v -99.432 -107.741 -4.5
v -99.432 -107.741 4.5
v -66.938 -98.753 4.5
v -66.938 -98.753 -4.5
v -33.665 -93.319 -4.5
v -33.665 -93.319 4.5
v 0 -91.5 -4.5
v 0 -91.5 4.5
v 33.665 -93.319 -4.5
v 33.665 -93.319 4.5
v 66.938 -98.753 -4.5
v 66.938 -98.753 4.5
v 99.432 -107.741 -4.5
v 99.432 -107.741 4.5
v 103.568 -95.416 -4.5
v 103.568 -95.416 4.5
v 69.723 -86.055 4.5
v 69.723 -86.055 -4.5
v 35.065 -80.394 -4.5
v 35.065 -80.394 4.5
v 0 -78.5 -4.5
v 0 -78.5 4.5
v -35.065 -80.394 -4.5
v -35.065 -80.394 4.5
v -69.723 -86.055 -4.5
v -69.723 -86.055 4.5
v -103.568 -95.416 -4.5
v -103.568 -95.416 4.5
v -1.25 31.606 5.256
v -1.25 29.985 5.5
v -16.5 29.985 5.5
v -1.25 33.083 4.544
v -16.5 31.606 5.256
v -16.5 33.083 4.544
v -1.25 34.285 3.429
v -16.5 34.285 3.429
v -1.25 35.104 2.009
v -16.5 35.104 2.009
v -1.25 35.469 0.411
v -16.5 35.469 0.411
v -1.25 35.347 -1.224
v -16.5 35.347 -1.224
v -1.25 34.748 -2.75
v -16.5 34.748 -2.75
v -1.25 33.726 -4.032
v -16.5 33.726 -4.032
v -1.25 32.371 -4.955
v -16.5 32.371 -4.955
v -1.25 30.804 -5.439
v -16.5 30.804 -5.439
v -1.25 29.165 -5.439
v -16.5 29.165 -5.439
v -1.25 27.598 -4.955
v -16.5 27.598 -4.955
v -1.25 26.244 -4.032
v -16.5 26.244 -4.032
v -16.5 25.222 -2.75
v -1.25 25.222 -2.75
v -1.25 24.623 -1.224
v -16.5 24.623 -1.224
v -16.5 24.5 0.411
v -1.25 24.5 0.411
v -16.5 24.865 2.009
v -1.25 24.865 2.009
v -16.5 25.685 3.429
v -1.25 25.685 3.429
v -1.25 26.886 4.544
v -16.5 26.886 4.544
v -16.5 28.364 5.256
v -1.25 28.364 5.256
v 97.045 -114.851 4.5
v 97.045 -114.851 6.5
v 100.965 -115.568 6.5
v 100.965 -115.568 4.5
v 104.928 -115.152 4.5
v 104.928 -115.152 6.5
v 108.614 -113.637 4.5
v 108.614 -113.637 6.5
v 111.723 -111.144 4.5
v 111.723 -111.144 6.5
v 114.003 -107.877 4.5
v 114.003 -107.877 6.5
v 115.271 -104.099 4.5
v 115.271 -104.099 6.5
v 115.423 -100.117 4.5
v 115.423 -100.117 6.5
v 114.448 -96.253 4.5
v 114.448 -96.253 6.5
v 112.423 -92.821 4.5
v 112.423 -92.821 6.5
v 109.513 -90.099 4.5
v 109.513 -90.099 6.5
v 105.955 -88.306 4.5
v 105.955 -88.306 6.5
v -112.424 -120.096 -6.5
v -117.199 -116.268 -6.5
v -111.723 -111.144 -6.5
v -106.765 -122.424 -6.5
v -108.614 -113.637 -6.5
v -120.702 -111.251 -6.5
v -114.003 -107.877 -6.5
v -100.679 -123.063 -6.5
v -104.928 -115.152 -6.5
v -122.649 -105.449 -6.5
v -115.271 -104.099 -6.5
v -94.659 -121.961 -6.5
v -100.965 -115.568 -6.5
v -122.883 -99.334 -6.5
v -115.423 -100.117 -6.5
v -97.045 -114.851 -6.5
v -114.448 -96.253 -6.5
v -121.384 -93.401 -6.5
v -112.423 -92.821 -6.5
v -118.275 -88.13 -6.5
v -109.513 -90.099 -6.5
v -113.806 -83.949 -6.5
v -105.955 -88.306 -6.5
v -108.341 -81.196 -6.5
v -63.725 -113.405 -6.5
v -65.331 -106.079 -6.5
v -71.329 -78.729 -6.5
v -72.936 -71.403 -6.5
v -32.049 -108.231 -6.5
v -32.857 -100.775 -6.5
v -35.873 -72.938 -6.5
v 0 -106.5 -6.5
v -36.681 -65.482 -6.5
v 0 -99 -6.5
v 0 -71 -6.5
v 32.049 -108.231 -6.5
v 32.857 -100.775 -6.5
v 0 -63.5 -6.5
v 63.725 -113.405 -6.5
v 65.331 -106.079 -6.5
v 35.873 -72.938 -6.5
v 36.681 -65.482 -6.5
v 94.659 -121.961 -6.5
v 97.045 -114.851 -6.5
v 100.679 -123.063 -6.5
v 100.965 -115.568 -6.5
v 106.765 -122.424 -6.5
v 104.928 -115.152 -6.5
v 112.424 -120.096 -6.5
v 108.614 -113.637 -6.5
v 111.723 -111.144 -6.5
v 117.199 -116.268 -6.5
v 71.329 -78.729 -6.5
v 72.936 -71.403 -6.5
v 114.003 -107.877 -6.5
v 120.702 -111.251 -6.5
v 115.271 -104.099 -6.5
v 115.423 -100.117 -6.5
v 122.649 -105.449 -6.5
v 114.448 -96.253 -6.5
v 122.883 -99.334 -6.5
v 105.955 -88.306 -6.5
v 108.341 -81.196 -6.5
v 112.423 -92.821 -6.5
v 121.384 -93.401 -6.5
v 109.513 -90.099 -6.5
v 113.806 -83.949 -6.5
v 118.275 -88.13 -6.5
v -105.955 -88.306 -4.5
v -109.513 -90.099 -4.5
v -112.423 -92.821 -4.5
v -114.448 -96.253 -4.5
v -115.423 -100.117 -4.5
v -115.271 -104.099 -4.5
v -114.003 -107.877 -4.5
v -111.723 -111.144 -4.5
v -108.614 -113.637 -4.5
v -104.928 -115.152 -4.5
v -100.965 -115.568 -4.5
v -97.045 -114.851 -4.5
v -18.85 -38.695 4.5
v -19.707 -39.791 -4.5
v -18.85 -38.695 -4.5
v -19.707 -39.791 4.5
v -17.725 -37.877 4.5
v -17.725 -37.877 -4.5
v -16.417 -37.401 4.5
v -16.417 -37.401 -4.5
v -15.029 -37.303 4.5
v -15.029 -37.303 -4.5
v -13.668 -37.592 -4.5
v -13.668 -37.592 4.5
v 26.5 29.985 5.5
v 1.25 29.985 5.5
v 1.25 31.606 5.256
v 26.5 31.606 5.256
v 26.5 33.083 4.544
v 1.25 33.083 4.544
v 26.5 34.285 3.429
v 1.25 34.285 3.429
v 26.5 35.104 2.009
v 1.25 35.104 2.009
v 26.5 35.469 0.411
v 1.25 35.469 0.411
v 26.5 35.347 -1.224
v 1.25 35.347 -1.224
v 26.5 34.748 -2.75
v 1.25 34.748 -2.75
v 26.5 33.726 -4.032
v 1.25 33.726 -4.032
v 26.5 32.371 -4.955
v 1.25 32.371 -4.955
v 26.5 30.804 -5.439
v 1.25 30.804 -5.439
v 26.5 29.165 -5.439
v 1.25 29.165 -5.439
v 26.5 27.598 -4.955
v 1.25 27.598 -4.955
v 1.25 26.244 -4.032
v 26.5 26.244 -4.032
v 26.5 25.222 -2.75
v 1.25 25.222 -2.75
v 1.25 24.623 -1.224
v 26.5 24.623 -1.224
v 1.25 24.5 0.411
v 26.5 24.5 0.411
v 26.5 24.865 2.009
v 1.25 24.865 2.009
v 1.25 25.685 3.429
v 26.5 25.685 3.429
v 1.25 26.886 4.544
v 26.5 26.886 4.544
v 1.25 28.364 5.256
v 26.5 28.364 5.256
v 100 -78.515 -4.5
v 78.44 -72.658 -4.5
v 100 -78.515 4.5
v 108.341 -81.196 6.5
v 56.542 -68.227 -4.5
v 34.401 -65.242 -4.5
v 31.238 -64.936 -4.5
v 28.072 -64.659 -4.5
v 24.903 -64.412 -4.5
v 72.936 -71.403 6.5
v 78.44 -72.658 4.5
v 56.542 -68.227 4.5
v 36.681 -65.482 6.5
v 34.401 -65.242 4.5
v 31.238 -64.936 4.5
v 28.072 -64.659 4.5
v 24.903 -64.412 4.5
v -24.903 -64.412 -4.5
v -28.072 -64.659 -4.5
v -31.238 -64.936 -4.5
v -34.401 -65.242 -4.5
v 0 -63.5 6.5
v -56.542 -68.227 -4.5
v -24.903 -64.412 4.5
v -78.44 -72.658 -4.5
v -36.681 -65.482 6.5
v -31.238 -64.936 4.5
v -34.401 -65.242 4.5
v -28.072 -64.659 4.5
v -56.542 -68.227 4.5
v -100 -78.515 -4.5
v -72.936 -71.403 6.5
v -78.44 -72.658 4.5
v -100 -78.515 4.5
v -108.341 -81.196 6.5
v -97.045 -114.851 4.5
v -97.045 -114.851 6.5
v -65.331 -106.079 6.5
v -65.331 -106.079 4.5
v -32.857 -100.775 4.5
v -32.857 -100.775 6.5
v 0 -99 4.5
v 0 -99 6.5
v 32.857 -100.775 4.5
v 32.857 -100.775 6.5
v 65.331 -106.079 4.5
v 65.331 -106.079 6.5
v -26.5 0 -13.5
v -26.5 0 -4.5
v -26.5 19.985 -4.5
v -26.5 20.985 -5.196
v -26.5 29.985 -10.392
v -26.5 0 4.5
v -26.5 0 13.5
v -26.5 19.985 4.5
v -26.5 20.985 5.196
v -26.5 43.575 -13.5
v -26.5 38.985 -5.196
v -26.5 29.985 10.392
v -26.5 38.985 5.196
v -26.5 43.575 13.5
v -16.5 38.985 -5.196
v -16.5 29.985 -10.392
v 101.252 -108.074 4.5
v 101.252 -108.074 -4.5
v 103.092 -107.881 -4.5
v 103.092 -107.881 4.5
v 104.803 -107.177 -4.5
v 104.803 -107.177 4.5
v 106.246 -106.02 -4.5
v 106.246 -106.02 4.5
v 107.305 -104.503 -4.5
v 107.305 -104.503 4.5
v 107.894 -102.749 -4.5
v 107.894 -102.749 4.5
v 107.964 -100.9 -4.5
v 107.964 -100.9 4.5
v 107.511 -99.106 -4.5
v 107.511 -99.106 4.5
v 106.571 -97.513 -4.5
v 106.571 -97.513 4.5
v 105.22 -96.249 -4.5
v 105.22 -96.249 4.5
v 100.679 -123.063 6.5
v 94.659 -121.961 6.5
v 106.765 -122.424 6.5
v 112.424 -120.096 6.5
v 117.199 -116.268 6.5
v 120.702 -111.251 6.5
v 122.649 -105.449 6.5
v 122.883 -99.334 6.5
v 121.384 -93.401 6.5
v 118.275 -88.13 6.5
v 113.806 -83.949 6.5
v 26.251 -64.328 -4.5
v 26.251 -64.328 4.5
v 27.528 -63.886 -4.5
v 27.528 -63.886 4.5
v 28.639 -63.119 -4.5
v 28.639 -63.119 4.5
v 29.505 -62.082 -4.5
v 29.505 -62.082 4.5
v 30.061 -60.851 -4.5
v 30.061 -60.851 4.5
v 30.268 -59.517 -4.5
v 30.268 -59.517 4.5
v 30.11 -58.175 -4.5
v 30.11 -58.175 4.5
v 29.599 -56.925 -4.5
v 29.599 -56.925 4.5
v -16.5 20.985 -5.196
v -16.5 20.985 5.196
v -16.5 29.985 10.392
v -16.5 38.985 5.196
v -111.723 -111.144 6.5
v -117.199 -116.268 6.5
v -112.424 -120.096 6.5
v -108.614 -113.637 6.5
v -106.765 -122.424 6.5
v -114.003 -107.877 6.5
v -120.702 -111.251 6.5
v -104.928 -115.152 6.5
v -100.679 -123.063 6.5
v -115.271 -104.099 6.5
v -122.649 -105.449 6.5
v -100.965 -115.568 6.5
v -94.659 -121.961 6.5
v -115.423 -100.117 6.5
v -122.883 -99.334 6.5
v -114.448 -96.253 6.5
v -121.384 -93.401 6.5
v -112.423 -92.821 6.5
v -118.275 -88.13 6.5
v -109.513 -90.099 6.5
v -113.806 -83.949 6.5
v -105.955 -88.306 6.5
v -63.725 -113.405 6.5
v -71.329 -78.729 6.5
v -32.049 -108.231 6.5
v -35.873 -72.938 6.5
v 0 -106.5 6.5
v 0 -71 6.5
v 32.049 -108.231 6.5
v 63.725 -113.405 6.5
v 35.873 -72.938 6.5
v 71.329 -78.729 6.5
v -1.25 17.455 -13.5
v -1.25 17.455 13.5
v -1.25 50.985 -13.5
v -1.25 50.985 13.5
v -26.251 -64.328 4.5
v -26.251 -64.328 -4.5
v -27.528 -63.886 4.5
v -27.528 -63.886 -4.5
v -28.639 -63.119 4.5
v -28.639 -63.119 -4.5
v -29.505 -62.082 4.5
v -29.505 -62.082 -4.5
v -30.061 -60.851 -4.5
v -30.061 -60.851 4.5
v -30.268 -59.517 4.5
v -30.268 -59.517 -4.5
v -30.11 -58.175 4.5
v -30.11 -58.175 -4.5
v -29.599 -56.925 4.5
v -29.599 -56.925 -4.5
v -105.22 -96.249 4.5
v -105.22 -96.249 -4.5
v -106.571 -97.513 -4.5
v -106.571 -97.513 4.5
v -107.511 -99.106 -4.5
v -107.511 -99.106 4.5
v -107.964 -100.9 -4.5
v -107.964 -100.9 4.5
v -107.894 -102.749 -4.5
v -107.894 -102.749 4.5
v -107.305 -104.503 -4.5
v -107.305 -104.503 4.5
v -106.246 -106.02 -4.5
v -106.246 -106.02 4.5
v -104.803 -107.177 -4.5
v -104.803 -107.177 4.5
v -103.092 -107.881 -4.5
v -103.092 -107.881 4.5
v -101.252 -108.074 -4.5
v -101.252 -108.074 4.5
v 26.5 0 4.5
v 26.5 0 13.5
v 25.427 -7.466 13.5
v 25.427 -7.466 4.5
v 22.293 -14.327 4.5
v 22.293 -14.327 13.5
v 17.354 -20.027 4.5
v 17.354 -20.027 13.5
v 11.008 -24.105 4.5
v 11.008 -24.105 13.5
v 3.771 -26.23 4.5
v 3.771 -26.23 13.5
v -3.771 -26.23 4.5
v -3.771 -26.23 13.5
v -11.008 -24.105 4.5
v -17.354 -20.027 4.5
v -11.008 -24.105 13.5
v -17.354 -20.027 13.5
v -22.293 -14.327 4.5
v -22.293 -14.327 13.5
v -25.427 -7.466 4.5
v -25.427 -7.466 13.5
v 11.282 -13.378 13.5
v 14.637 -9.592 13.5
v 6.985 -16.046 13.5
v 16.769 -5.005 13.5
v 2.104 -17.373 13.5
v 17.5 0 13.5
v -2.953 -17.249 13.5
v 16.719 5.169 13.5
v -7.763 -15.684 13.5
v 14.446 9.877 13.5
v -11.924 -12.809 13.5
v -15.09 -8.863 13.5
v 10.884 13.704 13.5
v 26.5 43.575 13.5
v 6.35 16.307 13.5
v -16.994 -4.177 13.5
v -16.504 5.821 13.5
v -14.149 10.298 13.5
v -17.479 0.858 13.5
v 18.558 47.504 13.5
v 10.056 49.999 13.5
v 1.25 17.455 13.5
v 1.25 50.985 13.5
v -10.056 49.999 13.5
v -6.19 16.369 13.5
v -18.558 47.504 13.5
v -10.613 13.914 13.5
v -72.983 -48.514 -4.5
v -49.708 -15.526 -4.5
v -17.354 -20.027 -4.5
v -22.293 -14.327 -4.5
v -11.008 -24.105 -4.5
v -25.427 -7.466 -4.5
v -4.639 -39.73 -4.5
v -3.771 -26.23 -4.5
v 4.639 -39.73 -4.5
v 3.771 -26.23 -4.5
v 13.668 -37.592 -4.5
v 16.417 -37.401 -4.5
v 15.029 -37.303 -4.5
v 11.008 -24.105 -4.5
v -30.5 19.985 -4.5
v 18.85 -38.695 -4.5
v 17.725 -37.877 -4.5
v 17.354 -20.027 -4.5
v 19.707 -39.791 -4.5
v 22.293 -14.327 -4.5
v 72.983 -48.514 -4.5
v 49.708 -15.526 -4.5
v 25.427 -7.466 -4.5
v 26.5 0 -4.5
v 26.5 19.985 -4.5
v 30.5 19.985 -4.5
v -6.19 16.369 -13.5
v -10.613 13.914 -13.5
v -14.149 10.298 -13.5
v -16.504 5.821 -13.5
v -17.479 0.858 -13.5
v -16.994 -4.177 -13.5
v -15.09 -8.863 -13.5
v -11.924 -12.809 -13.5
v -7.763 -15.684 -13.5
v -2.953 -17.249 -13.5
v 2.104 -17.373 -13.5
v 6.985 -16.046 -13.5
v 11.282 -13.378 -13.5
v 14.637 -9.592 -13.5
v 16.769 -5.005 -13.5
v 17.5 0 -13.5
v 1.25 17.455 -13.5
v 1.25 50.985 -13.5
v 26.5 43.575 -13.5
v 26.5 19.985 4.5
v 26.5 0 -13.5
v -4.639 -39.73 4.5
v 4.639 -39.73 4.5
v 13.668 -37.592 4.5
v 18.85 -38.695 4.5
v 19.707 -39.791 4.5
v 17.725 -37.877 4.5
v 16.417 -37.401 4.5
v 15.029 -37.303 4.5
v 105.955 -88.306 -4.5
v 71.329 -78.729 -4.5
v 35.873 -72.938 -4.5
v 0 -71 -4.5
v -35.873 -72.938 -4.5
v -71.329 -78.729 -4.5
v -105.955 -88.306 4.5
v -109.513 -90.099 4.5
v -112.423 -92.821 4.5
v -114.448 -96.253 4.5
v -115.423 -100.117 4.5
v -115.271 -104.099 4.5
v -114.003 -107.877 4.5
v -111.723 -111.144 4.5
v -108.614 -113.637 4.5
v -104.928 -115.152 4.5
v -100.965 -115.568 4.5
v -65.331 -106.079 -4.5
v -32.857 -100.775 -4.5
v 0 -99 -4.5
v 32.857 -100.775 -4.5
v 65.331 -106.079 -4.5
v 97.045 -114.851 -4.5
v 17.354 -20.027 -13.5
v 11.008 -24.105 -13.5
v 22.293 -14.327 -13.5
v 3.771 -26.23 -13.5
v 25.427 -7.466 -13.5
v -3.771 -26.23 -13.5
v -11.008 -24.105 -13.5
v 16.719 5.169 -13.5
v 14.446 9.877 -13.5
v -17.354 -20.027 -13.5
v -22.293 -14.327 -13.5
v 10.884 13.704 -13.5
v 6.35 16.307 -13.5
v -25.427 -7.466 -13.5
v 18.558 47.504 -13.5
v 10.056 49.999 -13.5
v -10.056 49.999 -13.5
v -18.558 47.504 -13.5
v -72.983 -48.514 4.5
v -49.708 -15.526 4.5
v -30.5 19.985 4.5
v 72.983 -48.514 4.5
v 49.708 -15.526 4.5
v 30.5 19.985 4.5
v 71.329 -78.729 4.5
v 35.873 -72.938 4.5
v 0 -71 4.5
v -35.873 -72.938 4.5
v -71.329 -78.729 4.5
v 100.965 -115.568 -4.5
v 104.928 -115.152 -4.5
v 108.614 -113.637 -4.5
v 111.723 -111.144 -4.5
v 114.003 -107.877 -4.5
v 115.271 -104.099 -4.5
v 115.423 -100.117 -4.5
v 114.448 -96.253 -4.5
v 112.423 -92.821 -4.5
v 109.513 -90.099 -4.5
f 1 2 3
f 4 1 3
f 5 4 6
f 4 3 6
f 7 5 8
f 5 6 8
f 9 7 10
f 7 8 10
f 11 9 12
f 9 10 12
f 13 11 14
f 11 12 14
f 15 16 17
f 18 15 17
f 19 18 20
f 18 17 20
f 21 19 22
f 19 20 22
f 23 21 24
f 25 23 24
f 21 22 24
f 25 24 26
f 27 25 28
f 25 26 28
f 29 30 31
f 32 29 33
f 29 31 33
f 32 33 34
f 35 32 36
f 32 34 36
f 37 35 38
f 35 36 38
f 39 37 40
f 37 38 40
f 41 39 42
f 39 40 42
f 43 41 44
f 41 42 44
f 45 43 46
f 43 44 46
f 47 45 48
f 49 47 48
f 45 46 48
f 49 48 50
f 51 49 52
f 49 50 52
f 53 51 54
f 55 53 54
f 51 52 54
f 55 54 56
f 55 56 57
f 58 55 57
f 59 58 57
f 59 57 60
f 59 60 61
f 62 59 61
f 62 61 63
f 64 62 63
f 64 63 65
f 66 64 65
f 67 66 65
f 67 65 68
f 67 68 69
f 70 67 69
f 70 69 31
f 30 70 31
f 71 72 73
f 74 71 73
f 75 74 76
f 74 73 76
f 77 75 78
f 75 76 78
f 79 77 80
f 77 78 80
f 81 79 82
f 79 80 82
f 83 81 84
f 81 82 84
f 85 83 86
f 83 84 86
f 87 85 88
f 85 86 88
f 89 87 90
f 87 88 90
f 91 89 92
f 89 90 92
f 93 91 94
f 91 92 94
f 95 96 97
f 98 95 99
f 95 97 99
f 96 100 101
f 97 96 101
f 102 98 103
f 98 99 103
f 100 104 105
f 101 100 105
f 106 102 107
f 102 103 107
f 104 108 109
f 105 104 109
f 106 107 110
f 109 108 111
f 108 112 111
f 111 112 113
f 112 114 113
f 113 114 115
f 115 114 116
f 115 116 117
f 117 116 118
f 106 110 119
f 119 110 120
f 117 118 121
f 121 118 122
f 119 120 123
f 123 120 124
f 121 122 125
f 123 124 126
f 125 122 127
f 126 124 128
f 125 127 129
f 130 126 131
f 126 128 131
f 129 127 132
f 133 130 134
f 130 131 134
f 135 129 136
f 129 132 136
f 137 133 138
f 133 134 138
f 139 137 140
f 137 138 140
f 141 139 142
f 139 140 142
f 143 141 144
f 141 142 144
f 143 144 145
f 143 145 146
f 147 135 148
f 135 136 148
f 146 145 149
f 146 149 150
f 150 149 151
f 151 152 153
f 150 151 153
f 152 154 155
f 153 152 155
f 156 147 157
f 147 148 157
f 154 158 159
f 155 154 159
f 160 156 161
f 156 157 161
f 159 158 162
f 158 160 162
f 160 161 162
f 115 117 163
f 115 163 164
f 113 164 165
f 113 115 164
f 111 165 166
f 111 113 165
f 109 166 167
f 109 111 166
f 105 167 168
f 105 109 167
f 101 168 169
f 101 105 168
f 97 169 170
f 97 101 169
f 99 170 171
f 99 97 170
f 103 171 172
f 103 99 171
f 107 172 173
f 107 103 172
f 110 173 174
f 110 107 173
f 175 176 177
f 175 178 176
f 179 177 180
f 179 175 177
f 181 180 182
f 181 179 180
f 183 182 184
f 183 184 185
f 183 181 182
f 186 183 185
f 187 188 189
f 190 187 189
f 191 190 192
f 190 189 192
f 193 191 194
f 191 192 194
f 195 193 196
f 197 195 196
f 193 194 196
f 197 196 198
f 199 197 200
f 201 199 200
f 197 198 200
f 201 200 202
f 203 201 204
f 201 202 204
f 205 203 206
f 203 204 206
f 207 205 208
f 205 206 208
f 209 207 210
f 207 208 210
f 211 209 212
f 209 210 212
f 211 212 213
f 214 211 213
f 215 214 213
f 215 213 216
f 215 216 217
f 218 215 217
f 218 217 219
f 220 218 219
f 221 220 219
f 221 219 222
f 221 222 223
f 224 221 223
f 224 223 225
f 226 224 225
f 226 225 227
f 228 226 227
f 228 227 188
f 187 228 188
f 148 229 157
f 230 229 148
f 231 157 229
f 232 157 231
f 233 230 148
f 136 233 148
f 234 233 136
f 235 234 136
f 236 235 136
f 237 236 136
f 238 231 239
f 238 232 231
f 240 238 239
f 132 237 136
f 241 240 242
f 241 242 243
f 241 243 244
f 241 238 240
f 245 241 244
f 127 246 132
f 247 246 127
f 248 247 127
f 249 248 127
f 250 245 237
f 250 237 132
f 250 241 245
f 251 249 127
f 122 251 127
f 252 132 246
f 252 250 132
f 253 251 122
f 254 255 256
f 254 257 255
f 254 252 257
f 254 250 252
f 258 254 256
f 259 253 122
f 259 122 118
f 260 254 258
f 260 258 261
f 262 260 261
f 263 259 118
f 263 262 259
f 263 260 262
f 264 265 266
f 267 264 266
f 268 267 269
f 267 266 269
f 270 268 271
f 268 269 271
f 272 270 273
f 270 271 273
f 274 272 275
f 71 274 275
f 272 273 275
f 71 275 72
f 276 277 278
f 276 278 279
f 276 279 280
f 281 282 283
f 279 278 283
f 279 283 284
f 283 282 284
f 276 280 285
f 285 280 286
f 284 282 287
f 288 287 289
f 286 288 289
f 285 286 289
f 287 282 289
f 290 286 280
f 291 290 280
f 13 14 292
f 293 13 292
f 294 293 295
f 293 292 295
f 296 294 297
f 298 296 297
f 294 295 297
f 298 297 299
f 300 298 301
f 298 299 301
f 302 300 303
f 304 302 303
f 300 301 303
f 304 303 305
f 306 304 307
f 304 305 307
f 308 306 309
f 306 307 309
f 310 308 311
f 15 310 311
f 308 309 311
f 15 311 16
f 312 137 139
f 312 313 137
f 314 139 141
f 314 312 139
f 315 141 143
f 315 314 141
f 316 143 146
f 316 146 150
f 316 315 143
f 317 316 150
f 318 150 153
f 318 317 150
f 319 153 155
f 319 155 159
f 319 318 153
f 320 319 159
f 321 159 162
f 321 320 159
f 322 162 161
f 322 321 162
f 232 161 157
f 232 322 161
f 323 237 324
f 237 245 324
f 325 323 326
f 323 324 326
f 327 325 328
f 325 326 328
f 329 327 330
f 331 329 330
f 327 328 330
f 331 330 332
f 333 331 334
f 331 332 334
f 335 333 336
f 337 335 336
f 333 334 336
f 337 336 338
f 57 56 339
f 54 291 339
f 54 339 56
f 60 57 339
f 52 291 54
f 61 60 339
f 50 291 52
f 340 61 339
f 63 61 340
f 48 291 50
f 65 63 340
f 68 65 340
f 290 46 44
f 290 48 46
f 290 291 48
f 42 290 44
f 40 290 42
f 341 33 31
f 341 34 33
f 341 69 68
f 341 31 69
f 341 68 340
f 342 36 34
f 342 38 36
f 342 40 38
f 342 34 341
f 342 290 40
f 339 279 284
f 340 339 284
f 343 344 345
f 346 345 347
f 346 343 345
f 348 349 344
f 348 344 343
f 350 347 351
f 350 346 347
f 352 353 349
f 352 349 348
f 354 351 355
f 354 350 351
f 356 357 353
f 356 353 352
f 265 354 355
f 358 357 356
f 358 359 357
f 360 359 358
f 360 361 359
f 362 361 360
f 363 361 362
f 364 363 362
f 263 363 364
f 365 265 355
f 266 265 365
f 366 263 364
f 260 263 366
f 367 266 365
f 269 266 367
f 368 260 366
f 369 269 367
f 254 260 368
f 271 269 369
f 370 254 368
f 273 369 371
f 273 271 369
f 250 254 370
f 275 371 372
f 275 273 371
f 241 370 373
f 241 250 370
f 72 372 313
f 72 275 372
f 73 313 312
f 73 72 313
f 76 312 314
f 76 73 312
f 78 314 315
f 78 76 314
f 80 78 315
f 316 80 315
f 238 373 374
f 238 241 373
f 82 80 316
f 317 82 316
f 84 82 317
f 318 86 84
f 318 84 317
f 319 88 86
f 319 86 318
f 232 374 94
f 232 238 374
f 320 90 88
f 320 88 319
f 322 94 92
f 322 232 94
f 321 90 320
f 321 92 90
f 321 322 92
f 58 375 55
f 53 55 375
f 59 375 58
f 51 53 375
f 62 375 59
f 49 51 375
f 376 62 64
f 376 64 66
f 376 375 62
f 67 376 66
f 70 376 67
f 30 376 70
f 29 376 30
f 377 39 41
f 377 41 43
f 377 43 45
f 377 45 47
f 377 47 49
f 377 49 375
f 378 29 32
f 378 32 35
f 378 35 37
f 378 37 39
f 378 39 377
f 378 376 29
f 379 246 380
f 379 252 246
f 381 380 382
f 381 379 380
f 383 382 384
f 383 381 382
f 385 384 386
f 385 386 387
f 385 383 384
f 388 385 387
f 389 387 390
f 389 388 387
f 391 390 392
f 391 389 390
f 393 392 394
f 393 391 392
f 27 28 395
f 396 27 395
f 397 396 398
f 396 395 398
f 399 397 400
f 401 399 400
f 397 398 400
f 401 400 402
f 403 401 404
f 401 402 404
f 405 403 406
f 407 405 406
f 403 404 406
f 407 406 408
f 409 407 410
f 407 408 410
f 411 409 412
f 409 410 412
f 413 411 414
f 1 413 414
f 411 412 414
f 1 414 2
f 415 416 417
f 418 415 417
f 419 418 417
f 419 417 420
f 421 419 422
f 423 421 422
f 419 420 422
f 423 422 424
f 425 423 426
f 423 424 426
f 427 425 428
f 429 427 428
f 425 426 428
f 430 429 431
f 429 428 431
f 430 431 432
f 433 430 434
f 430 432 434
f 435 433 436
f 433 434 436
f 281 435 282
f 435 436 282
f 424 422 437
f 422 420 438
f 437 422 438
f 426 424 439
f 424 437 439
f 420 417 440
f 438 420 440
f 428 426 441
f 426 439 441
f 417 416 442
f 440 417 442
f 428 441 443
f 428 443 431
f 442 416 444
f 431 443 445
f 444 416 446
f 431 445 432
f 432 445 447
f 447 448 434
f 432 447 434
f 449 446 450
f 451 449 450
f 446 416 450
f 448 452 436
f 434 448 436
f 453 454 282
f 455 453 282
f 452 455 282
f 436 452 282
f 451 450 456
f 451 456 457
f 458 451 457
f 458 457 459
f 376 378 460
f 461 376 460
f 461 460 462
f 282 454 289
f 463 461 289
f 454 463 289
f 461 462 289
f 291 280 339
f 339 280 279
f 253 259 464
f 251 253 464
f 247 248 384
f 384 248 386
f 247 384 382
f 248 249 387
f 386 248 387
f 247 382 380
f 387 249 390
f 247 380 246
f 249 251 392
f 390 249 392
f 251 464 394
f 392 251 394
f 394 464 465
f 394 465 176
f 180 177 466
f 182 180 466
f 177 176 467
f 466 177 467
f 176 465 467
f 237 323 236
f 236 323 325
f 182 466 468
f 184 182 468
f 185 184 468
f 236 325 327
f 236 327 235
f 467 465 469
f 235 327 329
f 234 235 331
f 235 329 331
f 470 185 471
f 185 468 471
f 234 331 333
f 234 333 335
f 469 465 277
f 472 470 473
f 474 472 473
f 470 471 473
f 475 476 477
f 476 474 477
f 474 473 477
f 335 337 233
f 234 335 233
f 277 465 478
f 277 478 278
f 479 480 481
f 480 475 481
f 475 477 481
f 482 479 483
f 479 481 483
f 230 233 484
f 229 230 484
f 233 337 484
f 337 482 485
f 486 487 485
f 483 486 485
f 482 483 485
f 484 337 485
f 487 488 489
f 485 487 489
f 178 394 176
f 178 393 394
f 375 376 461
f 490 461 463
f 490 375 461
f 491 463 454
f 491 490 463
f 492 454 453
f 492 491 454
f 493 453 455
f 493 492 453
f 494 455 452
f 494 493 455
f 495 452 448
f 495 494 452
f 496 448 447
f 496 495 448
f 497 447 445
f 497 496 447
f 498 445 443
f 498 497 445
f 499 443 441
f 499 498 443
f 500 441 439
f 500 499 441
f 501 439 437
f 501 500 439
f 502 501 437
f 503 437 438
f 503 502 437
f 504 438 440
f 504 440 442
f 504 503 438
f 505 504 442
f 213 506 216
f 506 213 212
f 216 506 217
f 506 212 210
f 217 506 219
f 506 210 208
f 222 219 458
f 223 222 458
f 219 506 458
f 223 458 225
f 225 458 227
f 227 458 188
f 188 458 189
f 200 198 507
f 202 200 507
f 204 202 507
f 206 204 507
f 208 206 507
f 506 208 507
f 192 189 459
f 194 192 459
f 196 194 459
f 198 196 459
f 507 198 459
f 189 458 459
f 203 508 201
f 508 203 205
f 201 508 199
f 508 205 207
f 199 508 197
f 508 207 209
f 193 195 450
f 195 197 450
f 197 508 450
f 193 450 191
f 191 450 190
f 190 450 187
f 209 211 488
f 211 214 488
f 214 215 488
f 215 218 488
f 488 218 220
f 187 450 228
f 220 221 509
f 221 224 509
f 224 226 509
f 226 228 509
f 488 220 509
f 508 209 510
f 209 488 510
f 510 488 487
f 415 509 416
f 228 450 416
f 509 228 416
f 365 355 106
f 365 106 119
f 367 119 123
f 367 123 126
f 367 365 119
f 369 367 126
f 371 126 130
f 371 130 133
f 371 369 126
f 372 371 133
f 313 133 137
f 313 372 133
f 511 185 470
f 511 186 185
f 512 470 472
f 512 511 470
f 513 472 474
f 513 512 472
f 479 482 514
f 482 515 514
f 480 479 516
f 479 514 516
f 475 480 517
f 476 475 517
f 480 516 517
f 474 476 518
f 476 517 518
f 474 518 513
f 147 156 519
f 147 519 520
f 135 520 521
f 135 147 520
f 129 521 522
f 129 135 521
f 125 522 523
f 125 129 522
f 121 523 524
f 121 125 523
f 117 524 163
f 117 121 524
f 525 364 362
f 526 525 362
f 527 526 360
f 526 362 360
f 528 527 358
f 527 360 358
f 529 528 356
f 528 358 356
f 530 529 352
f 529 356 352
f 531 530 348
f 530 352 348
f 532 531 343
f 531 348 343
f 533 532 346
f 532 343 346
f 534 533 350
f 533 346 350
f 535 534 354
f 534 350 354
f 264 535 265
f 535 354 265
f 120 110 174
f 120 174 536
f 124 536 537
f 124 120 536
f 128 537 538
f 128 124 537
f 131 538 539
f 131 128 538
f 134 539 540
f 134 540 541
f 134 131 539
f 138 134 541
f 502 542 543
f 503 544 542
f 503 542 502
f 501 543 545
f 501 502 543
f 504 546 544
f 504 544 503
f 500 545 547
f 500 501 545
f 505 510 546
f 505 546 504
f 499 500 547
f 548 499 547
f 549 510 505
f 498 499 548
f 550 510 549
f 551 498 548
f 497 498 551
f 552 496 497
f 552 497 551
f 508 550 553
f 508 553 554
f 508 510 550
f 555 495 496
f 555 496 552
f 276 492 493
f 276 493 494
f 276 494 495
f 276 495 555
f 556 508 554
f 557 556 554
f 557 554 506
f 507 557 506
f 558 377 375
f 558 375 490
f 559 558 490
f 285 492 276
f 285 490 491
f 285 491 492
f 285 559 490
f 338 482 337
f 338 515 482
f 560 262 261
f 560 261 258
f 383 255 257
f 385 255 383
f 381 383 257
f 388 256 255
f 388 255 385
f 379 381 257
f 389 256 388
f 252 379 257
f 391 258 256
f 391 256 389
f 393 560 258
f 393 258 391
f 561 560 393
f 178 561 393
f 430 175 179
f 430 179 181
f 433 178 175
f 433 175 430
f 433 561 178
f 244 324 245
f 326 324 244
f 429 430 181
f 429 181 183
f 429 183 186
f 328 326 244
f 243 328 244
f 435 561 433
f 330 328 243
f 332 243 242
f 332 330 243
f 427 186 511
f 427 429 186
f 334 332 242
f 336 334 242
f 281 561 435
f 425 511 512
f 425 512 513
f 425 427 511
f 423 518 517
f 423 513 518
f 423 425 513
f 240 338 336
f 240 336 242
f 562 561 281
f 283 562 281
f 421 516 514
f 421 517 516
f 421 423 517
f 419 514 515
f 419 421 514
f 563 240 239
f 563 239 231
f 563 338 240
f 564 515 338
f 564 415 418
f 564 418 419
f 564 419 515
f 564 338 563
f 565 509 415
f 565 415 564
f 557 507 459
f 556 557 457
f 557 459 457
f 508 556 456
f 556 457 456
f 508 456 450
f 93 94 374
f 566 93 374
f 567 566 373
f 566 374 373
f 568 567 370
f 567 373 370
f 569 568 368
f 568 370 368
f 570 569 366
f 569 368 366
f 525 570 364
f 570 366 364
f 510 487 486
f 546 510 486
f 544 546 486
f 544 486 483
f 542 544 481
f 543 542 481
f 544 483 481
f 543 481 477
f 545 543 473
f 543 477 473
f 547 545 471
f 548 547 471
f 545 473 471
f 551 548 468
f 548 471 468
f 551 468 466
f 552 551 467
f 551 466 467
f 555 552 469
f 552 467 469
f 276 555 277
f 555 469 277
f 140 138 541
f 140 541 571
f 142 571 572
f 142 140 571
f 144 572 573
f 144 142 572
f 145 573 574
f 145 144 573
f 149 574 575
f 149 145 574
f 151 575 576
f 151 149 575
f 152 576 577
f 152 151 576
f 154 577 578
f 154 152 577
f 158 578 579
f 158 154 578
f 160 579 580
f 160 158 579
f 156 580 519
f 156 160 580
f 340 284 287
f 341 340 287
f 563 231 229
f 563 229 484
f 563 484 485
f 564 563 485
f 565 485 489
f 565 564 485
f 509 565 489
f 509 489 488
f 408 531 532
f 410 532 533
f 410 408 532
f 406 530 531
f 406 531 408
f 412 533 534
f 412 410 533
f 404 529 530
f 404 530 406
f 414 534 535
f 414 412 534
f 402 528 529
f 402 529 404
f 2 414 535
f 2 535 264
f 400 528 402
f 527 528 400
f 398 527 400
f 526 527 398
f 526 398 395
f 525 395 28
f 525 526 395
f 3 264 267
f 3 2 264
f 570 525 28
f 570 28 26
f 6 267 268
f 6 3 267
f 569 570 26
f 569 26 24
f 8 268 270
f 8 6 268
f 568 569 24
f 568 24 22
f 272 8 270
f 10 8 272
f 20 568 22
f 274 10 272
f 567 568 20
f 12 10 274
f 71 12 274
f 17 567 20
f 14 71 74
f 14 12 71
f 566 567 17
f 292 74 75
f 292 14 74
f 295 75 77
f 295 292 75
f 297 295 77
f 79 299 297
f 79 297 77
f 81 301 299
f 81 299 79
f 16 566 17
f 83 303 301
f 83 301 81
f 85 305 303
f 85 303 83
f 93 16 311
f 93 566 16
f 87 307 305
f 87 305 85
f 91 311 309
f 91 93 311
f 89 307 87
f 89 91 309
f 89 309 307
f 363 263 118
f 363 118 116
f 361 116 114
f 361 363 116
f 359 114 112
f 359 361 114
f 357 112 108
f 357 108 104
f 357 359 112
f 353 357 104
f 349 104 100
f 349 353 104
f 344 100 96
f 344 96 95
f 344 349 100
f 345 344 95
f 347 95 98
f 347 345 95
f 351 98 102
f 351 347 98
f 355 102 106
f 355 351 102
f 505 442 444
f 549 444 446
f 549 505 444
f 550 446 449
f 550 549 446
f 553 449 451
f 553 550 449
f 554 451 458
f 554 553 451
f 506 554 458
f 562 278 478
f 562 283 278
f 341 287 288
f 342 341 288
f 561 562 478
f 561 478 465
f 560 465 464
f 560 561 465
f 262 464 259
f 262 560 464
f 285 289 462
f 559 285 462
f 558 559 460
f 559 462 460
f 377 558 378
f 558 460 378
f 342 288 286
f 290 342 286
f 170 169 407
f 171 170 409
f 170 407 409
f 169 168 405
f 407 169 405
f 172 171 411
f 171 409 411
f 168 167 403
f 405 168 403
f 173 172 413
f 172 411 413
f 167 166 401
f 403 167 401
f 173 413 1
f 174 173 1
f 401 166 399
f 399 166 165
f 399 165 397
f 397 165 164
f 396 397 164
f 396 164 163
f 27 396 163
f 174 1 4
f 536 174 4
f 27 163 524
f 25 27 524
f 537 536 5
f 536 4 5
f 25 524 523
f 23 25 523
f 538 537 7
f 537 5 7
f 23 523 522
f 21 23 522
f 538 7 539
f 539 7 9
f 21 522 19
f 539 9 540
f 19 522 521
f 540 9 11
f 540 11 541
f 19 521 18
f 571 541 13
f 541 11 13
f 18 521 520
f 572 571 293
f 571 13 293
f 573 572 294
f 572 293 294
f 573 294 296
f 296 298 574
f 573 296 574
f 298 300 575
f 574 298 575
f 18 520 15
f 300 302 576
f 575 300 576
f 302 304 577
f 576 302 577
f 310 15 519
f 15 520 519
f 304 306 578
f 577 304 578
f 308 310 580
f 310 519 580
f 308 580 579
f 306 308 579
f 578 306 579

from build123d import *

# Parameters (mm, degrees)
SKETCH_1_R          = 17.5
EXTRUDE_1_DEPTH     = 13.5
SKETCH_2_W          = 2.5
SKETCH_2_H          = 56.398475778
CUT_EXTRUDE_1_DEPTH = 64.5
SKETCH_3_R          = 5.5
CUT_EXTRUDE_2_DEPTH = 75.770900088
EXTRUDE_2_DEPTH     = 6.5
CUT_EXTRUDE_3_DEPTH = 2
SKETCH_6_R          = 0.0005
CUT_EXTRUDE_4_DEPTH = 175.932337555
EXTRUDE_3_DEPTH     = 4.5
FILLET_1_R          = 5
CUT_EXTRUDE_5_DEPTH = 10


with BuildPart() as part:
    # 草图1 → 凸台-拉伸1 (new, symmetric)
    with BuildSketch(Plane.XY):
        with BuildLine():
            Line((-26.5, 0), (-26.5, 43.574648593))
            ThreePointArc((-26.5, 43.574648593), (0, 51), (26.5, 43.574648593))
            Line((26.5, 43.574648593), (26.5, 0))
            ThreePointArc((26.5, 0), (0, -26.5), (-26.5, 0))
        make_face()
        Circle(SKETCH_1_R, mode=Mode.SUBTRACT)
    extrude(amount=EXTRUDE_1_DEPTH, both=True)

    # 草图2 → 切除-拉伸1 (cut, through all)
    with BuildSketch(Plane.XY.offset(13.5)):
        with Locations((0, 36.367769247)):
            Rectangle(SKETCH_2_W, SKETCH_2_H)
    extrude(amount=-CUT_EXTRUDE_1_DEPTH, mode=Mode.SUBTRACT)

    # 草图3 → 切除-拉伸2 (cut, through all)
    with BuildSketch(Plane.ZY.offset(26.5)):
        with Locations((0, 29.984679071)):
            Circle(SKETCH_3_R)
    extrude(amount=-CUT_EXTRUDE_2_DEPTH, mode=Mode.SUBTRACT)



with BuildPart() as body_2:
    # 草图4 → 凸台-拉伸2 (new, symmetric)
    with BuildSketch(Plane.XY):
        with BuildLine():
            ThreePointArc((108.340909091, -81.195883828), (0, -63.5), (-108.340909091, -81.195883828))
            ThreePointArc((-108.340909091, -81.195883828), (-121.88263876, -108.419431679), (-94.659090909, -121.961161348))
            ThreePointArc((-94.659090909, -121.961161348), (0, -106.5), (94.659090909, -121.961161348))
            ThreePointArc((94.659090909, -121.961161348), (121.88263876, -108.419431679), (108.340909091, -81.195883828))
        make_face()
    extrude(amount=EXTRUDE_2_DEPTH, both=True)

    # 草图5 → 切除-拉伸3 (cut)
    with BuildSketch(Plane.XY.offset(6.5)):
        with BuildLine():
            ThreePointArc((105.954545455, -88.306106652), (0, -71), (-105.954545455, -88.306106652))
            ThreePointArc((-105.954545455, -88.306106652), (-114.772415937, -106.033068043), (-97.045454545, -114.850938525))
            ThreePointArc((-97.045454545, -114.850938525), (0, -99), (97.045454545, -114.850938525))
            ThreePointArc((97.045454545, -114.850938525), (114.772415937, -106.033068043), (105.954545455, -88.306106652))
        make_face()
    cut_extrude_3 = extrude(amount=-CUT_EXTRUDE_3_DEPTH, mode=Mode.SUBTRACT)

    # 镜向1: 切除-拉伸3 across plane
    add(cut_extrude_3.mirror(Plane.XY), mode=Mode.SUBTRACT)

    # 草图6 → 切除-拉伸4 (cut, through all)
    with BuildSketch(Plane.XY.offset(4.5)):
        with BuildLine():
            ThreePointArc((103.568181818, -95.416329475), (0, -78.5), (-103.568181818, -95.416329475))
            ThreePointArc((-103.568181818, -95.416329475), (-107.662193113, -103.646704406), (-99.431818182, -107.740715702))
            ThreePointArc((-99.431818182, -107.740715702), (0, -91.5), (99.431818182, -107.740715702))
            ThreePointArc((99.431818182, -107.740715702), (107.662193113, -103.646704406), (103.568181818, -95.416329475))
        make_face()
        with Locations((0, -85)):
            Circle(SKETCH_6_R, mode=Mode.SUBTRACT)
    extrude(amount=-CUT_EXTRUDE_4_DEPTH, mode=Mode.SUBTRACT)


with BuildPart() as cut_extrude_4_piece_1:
    # of the separate pieces the step leaves, piece 1, a body of its own (cut_extrude_4_pieces)
    add(body_2.part.solids().sort_by_distance((94.659090909, -121.961161348, -6.5))[0])


with BuildPart() as cut_extrude_4_piece_2:
    # of the separate pieces the step leaves, piece 2, a body of its own (cut_extrude_4_pieces)
    add(body_2.part.solids().sort_by_distance((0.0005, -85, -4.5))[0])


with BuildPart() as part_1:
    add(part.part)

    add(cut_extrude_4_piece_1.part)  # 凸台-拉伸3 merges 切除-拉伸4 piece 1
    # 草图7 → 凸台-拉伸3 (add, symmetric)
    with BuildSketch(Plane.XY):
        with BuildLine():
            Line((-26.5, 19.984679071), (-30.5, 19.984679071))
            ThreePointArc((-30.5, 19.984679071), (-60.856176916, -32.365550062), (-100, -78.515361346))
            ThreePointArc((-100, -78.515361346), (-67.527443909, -70.26313611), (-34.401068107, -65.242245088))
            Line((-34.401068107, -65.242245088), (-17.5, -35.968736425))
            ThreePointArc((-17.5, -35.968736425), (0, -40), (17.5, -35.968736425))
            Line((17.5, -35.968736425), (34.401068107, -65.242245088))
            ThreePointArc((34.401068107, -65.242245088), (67.527443909, -70.26313611), (100, -78.515361346))
            ThreePointArc((100, -78.515361346), (60.856176916, -32.365550062), (30.5, 19.984679071))
            Line((30.5, 19.984679071), (26.5, 19.984679071))
            Line((26.5, 19.984679071), (26.5, 0))
            ThreePointArc((26.5, 0), (0, -26.5), (-26.5, 0))
            Line((-26.5, 0), (-26.5, 19.984679071))
        make_face()
    extrude(amount=EXTRUDE_3_DEPTH, both=True)

    # 圆角1
    fillet_1_edges = [part_1.edges().sort_by_distance(p)[0] for p in [
        (-34.401068107, -65.242245088, 0),
        (-17.5, -35.968736425, 0),
        (17.5, -35.968736425, 0),
        (34.401068107, -65.242245088, 0),
    ]]
    fillet(fillet_1_edges, radius=FILLET_1_R)

    # 草图8 → 切除-拉伸5 (cut)
    with BuildSketch(Plane.ZY.offset(26.5)):
        Polygon((5.196152423, 38.984679071), (-5.196152423, 38.984679071), (-10.392304845, 29.984679071), (-5.196152423, 20.984679071), (5.196152423, 20.984679071), (10.392304845, 29.984679071), align=None)
    extrude(amount=-CUT_EXTRUDE_5_DEPTH, mode=Mode.SUBTRACT)


solid = Compound([cut_extrude_4_piece_2.part, part_1.part])
